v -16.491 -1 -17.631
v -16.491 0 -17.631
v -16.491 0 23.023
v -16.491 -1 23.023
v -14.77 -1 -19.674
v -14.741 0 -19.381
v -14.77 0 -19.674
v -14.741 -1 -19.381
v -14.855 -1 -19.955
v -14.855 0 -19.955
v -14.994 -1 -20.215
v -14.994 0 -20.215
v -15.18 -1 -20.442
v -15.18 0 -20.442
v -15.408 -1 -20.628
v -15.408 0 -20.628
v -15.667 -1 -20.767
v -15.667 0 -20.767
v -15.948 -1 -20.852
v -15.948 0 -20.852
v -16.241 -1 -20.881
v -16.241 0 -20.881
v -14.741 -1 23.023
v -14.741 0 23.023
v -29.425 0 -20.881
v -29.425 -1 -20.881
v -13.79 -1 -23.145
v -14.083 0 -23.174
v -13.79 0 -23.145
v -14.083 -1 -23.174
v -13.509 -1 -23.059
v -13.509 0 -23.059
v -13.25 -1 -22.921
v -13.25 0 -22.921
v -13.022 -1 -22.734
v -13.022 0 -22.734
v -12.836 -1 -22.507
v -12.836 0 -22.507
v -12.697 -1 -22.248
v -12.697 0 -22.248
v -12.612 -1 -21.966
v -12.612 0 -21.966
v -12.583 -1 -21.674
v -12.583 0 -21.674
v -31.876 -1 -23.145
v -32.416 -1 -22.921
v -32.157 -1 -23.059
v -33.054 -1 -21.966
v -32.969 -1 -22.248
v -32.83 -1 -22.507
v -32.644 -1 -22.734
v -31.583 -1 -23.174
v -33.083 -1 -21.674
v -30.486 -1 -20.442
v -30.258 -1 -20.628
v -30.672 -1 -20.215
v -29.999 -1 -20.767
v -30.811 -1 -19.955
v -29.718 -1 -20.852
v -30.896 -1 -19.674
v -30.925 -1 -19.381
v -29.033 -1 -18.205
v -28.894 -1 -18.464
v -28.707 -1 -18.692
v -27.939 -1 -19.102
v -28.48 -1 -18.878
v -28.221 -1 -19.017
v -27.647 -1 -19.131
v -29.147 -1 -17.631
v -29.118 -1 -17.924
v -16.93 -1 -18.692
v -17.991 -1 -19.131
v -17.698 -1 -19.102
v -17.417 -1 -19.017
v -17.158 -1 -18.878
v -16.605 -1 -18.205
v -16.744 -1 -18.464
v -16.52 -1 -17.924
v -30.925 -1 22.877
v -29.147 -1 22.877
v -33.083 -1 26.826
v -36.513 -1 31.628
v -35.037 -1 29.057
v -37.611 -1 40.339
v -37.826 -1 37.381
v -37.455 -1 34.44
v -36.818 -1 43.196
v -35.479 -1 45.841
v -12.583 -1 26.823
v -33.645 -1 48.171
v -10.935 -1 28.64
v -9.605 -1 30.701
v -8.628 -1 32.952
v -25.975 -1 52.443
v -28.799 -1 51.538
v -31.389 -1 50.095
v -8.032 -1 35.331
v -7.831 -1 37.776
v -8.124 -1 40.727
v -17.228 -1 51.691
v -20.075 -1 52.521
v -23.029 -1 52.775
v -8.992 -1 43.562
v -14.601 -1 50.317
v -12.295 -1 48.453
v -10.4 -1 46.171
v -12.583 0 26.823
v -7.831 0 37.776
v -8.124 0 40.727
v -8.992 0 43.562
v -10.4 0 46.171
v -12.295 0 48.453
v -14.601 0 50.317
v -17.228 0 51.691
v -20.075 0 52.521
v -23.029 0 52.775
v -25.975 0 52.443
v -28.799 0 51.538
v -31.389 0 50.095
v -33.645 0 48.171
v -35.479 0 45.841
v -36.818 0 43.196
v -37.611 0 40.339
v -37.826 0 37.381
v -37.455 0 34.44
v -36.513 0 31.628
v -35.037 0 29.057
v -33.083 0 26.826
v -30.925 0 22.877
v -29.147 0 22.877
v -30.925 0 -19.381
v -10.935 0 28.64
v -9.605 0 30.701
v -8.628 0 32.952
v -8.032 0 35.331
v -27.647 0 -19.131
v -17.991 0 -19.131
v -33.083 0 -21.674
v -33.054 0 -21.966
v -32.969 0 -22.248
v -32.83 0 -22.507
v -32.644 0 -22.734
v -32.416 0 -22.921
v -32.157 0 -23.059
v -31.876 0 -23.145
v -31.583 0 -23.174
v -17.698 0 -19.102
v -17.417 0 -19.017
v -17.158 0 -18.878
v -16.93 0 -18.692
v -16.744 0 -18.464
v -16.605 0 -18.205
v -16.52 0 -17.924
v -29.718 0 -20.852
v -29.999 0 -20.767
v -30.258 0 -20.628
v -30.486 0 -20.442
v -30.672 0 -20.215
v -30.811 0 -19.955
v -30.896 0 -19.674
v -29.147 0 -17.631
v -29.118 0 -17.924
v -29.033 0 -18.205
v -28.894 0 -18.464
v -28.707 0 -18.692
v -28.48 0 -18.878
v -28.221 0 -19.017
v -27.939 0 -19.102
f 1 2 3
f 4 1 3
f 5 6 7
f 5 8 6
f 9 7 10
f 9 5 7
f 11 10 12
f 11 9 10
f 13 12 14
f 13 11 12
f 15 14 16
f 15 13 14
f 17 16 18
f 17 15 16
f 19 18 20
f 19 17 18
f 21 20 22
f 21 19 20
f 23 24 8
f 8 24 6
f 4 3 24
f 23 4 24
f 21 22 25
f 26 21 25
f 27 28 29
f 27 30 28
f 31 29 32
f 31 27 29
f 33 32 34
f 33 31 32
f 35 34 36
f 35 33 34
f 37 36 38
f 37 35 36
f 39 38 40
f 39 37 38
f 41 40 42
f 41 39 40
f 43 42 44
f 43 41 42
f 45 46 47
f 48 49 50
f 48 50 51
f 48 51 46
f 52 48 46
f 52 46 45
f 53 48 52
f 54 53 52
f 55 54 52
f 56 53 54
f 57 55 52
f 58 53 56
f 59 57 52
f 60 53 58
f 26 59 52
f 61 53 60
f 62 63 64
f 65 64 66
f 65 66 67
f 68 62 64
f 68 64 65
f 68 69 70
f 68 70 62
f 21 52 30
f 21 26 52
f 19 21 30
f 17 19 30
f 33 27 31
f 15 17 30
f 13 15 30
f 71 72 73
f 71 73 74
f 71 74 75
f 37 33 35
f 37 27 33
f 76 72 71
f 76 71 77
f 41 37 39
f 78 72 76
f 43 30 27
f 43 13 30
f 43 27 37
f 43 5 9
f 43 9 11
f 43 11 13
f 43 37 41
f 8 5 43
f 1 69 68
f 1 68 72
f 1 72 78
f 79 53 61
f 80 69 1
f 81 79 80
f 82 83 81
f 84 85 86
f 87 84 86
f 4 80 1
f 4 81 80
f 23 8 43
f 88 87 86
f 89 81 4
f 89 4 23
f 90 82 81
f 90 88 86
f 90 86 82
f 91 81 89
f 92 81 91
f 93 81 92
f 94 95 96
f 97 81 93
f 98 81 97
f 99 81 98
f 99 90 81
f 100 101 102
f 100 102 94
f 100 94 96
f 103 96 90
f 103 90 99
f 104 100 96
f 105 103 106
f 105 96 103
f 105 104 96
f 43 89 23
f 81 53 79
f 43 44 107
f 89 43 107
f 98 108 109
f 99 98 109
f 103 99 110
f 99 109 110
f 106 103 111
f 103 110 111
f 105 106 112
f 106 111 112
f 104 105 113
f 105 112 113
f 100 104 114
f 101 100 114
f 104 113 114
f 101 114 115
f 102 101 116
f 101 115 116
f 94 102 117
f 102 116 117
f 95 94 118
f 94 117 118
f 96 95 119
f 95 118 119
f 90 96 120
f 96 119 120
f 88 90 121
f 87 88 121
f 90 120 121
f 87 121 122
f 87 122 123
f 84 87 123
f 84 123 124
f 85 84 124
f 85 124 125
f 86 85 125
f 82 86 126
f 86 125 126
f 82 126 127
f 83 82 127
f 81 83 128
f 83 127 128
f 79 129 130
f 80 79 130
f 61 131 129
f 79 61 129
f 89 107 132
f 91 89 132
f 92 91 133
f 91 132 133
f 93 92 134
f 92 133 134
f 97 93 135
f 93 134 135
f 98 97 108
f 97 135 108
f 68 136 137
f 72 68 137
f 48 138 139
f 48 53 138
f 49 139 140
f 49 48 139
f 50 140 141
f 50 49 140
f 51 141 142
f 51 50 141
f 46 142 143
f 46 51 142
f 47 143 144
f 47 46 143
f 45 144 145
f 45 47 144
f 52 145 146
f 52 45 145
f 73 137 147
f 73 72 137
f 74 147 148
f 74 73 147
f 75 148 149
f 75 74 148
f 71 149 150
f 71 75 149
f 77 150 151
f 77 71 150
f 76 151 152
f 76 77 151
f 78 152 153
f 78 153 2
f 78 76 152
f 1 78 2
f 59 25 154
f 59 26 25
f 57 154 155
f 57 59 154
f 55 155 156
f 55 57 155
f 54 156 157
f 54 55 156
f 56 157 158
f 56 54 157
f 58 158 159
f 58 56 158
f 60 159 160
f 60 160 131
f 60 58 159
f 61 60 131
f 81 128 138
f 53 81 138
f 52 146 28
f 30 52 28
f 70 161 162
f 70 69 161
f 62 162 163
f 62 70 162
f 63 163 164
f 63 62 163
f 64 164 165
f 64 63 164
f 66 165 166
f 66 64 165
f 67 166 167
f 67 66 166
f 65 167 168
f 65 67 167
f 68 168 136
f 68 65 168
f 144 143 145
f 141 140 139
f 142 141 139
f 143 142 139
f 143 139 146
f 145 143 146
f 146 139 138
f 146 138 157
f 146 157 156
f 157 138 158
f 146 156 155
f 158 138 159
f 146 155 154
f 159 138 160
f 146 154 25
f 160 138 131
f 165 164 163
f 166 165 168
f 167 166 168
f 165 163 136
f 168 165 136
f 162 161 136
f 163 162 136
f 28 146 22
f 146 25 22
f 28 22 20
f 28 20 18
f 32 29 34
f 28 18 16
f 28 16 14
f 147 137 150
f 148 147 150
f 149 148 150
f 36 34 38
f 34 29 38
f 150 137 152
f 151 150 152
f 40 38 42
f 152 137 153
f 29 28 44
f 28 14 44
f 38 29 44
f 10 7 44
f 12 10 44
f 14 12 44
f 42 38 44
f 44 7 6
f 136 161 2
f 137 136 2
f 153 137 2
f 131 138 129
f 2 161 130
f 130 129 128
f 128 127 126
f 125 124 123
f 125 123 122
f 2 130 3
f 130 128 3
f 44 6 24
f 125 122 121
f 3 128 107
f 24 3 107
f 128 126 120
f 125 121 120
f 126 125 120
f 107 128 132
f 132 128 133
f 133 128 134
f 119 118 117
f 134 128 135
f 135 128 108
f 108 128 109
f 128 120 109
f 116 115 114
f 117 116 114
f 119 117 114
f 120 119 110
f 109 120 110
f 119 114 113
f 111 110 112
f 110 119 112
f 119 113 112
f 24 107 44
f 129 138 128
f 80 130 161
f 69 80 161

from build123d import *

# Parameters (mm, degrees)
F1_DEPTH = 1
F2_R     = 1.5
F3_R     = 1.5
F4_R     = 1.5
F5_R     = 1.5


with BuildPart() as f1:
    # F0 (on Front) → F1 (new body)
    with BuildSketch(Plane.XZ):
        with BuildLine():
            ThreePointArc((-12.582927, 26.823092), (-9.070294, 31.806561), (-7.831176, 37.776329))
            ThreePointArc((-7.831176, 37.776329), (-28.798743, 51.538165), (-33.082927, 26.826371))
            Line((-33.082927, 26.826371), (-12.582927, 26.826371))
            Line((-12.582927, 26.826371), (-12.582927, 26.823092))
        make_face()
        with BuildLine():
            Line((-12.582927, 26.826371), (-33.082927, 26.826371))
            ThreePointArc((-33.082927, 26.826371), (-22.833574, 22.776329), (-12.582927, 26.823092))
            Line((-12.582927, 26.823092), (-12.582927, 26.826371))
        make_face()
        with BuildLine():
            ThreePointArc((-12.582927, 26.823092), (-22.833574, 22.776329), (-33.082927, 26.826371))
            Line((-33.082927, 26.826371), (-33.082927, -23.173629))
            Line((-33.082927, -23.173629), (-12.582927, -23.173629))
            Line((-12.582927, -23.173629), (-12.582927, 26.823092))
        make_face()
        Polygon((-30.924927, -19.130884), (-30.924927, 22.876894), (-29.146819, 22.876894), (-29.146819, -19.130884), (-16.490985, -19.130884), (-16.490985, 23.022754), (-14.740985, 23.022754), (-14.740985, -19.130884), (-14.740985, -20.88121), (-16.490985, -20.88121), (-29.146819, -20.88121), (-30.924927, -20.88121), align=None, mode=Mode.SUBTRACT)
    extrude(amount=F1_DEPTH)

    # F2
    f2_edges = [f1.edges().sort_by_distance(p)[0] for p in [
        (-33.082927, -0.5, -23.173629),
        (-29.146819, -0.5, -19.130884),
    ]]
    fillet(f2_edges, radius=F2_R)

    # F3
    f3_edges = [f1.edges().sort_by_distance(p)[0] for p in [
        (-12.582927, -0.5, -23.173629),
        (-16.490985, -0.5, -19.130884),
    ]]
    fillet(f3_edges, radius=F3_R)

    # F4
    f4_edges = [f1.edges().sort_by_distance(p)[0] for p in [
        (-14.740985, -0.5, -20.88121),
    ]]
    fillet(f4_edges, radius=F4_R)

    # F5
    f5_edges = [f1.edges().sort_by_distance(p)[0] for p in [
        (-30.924927, -0.5, -20.88121),
    ]]
    fillet(f5_edges, radius=F5_R)


solid = f1.part
